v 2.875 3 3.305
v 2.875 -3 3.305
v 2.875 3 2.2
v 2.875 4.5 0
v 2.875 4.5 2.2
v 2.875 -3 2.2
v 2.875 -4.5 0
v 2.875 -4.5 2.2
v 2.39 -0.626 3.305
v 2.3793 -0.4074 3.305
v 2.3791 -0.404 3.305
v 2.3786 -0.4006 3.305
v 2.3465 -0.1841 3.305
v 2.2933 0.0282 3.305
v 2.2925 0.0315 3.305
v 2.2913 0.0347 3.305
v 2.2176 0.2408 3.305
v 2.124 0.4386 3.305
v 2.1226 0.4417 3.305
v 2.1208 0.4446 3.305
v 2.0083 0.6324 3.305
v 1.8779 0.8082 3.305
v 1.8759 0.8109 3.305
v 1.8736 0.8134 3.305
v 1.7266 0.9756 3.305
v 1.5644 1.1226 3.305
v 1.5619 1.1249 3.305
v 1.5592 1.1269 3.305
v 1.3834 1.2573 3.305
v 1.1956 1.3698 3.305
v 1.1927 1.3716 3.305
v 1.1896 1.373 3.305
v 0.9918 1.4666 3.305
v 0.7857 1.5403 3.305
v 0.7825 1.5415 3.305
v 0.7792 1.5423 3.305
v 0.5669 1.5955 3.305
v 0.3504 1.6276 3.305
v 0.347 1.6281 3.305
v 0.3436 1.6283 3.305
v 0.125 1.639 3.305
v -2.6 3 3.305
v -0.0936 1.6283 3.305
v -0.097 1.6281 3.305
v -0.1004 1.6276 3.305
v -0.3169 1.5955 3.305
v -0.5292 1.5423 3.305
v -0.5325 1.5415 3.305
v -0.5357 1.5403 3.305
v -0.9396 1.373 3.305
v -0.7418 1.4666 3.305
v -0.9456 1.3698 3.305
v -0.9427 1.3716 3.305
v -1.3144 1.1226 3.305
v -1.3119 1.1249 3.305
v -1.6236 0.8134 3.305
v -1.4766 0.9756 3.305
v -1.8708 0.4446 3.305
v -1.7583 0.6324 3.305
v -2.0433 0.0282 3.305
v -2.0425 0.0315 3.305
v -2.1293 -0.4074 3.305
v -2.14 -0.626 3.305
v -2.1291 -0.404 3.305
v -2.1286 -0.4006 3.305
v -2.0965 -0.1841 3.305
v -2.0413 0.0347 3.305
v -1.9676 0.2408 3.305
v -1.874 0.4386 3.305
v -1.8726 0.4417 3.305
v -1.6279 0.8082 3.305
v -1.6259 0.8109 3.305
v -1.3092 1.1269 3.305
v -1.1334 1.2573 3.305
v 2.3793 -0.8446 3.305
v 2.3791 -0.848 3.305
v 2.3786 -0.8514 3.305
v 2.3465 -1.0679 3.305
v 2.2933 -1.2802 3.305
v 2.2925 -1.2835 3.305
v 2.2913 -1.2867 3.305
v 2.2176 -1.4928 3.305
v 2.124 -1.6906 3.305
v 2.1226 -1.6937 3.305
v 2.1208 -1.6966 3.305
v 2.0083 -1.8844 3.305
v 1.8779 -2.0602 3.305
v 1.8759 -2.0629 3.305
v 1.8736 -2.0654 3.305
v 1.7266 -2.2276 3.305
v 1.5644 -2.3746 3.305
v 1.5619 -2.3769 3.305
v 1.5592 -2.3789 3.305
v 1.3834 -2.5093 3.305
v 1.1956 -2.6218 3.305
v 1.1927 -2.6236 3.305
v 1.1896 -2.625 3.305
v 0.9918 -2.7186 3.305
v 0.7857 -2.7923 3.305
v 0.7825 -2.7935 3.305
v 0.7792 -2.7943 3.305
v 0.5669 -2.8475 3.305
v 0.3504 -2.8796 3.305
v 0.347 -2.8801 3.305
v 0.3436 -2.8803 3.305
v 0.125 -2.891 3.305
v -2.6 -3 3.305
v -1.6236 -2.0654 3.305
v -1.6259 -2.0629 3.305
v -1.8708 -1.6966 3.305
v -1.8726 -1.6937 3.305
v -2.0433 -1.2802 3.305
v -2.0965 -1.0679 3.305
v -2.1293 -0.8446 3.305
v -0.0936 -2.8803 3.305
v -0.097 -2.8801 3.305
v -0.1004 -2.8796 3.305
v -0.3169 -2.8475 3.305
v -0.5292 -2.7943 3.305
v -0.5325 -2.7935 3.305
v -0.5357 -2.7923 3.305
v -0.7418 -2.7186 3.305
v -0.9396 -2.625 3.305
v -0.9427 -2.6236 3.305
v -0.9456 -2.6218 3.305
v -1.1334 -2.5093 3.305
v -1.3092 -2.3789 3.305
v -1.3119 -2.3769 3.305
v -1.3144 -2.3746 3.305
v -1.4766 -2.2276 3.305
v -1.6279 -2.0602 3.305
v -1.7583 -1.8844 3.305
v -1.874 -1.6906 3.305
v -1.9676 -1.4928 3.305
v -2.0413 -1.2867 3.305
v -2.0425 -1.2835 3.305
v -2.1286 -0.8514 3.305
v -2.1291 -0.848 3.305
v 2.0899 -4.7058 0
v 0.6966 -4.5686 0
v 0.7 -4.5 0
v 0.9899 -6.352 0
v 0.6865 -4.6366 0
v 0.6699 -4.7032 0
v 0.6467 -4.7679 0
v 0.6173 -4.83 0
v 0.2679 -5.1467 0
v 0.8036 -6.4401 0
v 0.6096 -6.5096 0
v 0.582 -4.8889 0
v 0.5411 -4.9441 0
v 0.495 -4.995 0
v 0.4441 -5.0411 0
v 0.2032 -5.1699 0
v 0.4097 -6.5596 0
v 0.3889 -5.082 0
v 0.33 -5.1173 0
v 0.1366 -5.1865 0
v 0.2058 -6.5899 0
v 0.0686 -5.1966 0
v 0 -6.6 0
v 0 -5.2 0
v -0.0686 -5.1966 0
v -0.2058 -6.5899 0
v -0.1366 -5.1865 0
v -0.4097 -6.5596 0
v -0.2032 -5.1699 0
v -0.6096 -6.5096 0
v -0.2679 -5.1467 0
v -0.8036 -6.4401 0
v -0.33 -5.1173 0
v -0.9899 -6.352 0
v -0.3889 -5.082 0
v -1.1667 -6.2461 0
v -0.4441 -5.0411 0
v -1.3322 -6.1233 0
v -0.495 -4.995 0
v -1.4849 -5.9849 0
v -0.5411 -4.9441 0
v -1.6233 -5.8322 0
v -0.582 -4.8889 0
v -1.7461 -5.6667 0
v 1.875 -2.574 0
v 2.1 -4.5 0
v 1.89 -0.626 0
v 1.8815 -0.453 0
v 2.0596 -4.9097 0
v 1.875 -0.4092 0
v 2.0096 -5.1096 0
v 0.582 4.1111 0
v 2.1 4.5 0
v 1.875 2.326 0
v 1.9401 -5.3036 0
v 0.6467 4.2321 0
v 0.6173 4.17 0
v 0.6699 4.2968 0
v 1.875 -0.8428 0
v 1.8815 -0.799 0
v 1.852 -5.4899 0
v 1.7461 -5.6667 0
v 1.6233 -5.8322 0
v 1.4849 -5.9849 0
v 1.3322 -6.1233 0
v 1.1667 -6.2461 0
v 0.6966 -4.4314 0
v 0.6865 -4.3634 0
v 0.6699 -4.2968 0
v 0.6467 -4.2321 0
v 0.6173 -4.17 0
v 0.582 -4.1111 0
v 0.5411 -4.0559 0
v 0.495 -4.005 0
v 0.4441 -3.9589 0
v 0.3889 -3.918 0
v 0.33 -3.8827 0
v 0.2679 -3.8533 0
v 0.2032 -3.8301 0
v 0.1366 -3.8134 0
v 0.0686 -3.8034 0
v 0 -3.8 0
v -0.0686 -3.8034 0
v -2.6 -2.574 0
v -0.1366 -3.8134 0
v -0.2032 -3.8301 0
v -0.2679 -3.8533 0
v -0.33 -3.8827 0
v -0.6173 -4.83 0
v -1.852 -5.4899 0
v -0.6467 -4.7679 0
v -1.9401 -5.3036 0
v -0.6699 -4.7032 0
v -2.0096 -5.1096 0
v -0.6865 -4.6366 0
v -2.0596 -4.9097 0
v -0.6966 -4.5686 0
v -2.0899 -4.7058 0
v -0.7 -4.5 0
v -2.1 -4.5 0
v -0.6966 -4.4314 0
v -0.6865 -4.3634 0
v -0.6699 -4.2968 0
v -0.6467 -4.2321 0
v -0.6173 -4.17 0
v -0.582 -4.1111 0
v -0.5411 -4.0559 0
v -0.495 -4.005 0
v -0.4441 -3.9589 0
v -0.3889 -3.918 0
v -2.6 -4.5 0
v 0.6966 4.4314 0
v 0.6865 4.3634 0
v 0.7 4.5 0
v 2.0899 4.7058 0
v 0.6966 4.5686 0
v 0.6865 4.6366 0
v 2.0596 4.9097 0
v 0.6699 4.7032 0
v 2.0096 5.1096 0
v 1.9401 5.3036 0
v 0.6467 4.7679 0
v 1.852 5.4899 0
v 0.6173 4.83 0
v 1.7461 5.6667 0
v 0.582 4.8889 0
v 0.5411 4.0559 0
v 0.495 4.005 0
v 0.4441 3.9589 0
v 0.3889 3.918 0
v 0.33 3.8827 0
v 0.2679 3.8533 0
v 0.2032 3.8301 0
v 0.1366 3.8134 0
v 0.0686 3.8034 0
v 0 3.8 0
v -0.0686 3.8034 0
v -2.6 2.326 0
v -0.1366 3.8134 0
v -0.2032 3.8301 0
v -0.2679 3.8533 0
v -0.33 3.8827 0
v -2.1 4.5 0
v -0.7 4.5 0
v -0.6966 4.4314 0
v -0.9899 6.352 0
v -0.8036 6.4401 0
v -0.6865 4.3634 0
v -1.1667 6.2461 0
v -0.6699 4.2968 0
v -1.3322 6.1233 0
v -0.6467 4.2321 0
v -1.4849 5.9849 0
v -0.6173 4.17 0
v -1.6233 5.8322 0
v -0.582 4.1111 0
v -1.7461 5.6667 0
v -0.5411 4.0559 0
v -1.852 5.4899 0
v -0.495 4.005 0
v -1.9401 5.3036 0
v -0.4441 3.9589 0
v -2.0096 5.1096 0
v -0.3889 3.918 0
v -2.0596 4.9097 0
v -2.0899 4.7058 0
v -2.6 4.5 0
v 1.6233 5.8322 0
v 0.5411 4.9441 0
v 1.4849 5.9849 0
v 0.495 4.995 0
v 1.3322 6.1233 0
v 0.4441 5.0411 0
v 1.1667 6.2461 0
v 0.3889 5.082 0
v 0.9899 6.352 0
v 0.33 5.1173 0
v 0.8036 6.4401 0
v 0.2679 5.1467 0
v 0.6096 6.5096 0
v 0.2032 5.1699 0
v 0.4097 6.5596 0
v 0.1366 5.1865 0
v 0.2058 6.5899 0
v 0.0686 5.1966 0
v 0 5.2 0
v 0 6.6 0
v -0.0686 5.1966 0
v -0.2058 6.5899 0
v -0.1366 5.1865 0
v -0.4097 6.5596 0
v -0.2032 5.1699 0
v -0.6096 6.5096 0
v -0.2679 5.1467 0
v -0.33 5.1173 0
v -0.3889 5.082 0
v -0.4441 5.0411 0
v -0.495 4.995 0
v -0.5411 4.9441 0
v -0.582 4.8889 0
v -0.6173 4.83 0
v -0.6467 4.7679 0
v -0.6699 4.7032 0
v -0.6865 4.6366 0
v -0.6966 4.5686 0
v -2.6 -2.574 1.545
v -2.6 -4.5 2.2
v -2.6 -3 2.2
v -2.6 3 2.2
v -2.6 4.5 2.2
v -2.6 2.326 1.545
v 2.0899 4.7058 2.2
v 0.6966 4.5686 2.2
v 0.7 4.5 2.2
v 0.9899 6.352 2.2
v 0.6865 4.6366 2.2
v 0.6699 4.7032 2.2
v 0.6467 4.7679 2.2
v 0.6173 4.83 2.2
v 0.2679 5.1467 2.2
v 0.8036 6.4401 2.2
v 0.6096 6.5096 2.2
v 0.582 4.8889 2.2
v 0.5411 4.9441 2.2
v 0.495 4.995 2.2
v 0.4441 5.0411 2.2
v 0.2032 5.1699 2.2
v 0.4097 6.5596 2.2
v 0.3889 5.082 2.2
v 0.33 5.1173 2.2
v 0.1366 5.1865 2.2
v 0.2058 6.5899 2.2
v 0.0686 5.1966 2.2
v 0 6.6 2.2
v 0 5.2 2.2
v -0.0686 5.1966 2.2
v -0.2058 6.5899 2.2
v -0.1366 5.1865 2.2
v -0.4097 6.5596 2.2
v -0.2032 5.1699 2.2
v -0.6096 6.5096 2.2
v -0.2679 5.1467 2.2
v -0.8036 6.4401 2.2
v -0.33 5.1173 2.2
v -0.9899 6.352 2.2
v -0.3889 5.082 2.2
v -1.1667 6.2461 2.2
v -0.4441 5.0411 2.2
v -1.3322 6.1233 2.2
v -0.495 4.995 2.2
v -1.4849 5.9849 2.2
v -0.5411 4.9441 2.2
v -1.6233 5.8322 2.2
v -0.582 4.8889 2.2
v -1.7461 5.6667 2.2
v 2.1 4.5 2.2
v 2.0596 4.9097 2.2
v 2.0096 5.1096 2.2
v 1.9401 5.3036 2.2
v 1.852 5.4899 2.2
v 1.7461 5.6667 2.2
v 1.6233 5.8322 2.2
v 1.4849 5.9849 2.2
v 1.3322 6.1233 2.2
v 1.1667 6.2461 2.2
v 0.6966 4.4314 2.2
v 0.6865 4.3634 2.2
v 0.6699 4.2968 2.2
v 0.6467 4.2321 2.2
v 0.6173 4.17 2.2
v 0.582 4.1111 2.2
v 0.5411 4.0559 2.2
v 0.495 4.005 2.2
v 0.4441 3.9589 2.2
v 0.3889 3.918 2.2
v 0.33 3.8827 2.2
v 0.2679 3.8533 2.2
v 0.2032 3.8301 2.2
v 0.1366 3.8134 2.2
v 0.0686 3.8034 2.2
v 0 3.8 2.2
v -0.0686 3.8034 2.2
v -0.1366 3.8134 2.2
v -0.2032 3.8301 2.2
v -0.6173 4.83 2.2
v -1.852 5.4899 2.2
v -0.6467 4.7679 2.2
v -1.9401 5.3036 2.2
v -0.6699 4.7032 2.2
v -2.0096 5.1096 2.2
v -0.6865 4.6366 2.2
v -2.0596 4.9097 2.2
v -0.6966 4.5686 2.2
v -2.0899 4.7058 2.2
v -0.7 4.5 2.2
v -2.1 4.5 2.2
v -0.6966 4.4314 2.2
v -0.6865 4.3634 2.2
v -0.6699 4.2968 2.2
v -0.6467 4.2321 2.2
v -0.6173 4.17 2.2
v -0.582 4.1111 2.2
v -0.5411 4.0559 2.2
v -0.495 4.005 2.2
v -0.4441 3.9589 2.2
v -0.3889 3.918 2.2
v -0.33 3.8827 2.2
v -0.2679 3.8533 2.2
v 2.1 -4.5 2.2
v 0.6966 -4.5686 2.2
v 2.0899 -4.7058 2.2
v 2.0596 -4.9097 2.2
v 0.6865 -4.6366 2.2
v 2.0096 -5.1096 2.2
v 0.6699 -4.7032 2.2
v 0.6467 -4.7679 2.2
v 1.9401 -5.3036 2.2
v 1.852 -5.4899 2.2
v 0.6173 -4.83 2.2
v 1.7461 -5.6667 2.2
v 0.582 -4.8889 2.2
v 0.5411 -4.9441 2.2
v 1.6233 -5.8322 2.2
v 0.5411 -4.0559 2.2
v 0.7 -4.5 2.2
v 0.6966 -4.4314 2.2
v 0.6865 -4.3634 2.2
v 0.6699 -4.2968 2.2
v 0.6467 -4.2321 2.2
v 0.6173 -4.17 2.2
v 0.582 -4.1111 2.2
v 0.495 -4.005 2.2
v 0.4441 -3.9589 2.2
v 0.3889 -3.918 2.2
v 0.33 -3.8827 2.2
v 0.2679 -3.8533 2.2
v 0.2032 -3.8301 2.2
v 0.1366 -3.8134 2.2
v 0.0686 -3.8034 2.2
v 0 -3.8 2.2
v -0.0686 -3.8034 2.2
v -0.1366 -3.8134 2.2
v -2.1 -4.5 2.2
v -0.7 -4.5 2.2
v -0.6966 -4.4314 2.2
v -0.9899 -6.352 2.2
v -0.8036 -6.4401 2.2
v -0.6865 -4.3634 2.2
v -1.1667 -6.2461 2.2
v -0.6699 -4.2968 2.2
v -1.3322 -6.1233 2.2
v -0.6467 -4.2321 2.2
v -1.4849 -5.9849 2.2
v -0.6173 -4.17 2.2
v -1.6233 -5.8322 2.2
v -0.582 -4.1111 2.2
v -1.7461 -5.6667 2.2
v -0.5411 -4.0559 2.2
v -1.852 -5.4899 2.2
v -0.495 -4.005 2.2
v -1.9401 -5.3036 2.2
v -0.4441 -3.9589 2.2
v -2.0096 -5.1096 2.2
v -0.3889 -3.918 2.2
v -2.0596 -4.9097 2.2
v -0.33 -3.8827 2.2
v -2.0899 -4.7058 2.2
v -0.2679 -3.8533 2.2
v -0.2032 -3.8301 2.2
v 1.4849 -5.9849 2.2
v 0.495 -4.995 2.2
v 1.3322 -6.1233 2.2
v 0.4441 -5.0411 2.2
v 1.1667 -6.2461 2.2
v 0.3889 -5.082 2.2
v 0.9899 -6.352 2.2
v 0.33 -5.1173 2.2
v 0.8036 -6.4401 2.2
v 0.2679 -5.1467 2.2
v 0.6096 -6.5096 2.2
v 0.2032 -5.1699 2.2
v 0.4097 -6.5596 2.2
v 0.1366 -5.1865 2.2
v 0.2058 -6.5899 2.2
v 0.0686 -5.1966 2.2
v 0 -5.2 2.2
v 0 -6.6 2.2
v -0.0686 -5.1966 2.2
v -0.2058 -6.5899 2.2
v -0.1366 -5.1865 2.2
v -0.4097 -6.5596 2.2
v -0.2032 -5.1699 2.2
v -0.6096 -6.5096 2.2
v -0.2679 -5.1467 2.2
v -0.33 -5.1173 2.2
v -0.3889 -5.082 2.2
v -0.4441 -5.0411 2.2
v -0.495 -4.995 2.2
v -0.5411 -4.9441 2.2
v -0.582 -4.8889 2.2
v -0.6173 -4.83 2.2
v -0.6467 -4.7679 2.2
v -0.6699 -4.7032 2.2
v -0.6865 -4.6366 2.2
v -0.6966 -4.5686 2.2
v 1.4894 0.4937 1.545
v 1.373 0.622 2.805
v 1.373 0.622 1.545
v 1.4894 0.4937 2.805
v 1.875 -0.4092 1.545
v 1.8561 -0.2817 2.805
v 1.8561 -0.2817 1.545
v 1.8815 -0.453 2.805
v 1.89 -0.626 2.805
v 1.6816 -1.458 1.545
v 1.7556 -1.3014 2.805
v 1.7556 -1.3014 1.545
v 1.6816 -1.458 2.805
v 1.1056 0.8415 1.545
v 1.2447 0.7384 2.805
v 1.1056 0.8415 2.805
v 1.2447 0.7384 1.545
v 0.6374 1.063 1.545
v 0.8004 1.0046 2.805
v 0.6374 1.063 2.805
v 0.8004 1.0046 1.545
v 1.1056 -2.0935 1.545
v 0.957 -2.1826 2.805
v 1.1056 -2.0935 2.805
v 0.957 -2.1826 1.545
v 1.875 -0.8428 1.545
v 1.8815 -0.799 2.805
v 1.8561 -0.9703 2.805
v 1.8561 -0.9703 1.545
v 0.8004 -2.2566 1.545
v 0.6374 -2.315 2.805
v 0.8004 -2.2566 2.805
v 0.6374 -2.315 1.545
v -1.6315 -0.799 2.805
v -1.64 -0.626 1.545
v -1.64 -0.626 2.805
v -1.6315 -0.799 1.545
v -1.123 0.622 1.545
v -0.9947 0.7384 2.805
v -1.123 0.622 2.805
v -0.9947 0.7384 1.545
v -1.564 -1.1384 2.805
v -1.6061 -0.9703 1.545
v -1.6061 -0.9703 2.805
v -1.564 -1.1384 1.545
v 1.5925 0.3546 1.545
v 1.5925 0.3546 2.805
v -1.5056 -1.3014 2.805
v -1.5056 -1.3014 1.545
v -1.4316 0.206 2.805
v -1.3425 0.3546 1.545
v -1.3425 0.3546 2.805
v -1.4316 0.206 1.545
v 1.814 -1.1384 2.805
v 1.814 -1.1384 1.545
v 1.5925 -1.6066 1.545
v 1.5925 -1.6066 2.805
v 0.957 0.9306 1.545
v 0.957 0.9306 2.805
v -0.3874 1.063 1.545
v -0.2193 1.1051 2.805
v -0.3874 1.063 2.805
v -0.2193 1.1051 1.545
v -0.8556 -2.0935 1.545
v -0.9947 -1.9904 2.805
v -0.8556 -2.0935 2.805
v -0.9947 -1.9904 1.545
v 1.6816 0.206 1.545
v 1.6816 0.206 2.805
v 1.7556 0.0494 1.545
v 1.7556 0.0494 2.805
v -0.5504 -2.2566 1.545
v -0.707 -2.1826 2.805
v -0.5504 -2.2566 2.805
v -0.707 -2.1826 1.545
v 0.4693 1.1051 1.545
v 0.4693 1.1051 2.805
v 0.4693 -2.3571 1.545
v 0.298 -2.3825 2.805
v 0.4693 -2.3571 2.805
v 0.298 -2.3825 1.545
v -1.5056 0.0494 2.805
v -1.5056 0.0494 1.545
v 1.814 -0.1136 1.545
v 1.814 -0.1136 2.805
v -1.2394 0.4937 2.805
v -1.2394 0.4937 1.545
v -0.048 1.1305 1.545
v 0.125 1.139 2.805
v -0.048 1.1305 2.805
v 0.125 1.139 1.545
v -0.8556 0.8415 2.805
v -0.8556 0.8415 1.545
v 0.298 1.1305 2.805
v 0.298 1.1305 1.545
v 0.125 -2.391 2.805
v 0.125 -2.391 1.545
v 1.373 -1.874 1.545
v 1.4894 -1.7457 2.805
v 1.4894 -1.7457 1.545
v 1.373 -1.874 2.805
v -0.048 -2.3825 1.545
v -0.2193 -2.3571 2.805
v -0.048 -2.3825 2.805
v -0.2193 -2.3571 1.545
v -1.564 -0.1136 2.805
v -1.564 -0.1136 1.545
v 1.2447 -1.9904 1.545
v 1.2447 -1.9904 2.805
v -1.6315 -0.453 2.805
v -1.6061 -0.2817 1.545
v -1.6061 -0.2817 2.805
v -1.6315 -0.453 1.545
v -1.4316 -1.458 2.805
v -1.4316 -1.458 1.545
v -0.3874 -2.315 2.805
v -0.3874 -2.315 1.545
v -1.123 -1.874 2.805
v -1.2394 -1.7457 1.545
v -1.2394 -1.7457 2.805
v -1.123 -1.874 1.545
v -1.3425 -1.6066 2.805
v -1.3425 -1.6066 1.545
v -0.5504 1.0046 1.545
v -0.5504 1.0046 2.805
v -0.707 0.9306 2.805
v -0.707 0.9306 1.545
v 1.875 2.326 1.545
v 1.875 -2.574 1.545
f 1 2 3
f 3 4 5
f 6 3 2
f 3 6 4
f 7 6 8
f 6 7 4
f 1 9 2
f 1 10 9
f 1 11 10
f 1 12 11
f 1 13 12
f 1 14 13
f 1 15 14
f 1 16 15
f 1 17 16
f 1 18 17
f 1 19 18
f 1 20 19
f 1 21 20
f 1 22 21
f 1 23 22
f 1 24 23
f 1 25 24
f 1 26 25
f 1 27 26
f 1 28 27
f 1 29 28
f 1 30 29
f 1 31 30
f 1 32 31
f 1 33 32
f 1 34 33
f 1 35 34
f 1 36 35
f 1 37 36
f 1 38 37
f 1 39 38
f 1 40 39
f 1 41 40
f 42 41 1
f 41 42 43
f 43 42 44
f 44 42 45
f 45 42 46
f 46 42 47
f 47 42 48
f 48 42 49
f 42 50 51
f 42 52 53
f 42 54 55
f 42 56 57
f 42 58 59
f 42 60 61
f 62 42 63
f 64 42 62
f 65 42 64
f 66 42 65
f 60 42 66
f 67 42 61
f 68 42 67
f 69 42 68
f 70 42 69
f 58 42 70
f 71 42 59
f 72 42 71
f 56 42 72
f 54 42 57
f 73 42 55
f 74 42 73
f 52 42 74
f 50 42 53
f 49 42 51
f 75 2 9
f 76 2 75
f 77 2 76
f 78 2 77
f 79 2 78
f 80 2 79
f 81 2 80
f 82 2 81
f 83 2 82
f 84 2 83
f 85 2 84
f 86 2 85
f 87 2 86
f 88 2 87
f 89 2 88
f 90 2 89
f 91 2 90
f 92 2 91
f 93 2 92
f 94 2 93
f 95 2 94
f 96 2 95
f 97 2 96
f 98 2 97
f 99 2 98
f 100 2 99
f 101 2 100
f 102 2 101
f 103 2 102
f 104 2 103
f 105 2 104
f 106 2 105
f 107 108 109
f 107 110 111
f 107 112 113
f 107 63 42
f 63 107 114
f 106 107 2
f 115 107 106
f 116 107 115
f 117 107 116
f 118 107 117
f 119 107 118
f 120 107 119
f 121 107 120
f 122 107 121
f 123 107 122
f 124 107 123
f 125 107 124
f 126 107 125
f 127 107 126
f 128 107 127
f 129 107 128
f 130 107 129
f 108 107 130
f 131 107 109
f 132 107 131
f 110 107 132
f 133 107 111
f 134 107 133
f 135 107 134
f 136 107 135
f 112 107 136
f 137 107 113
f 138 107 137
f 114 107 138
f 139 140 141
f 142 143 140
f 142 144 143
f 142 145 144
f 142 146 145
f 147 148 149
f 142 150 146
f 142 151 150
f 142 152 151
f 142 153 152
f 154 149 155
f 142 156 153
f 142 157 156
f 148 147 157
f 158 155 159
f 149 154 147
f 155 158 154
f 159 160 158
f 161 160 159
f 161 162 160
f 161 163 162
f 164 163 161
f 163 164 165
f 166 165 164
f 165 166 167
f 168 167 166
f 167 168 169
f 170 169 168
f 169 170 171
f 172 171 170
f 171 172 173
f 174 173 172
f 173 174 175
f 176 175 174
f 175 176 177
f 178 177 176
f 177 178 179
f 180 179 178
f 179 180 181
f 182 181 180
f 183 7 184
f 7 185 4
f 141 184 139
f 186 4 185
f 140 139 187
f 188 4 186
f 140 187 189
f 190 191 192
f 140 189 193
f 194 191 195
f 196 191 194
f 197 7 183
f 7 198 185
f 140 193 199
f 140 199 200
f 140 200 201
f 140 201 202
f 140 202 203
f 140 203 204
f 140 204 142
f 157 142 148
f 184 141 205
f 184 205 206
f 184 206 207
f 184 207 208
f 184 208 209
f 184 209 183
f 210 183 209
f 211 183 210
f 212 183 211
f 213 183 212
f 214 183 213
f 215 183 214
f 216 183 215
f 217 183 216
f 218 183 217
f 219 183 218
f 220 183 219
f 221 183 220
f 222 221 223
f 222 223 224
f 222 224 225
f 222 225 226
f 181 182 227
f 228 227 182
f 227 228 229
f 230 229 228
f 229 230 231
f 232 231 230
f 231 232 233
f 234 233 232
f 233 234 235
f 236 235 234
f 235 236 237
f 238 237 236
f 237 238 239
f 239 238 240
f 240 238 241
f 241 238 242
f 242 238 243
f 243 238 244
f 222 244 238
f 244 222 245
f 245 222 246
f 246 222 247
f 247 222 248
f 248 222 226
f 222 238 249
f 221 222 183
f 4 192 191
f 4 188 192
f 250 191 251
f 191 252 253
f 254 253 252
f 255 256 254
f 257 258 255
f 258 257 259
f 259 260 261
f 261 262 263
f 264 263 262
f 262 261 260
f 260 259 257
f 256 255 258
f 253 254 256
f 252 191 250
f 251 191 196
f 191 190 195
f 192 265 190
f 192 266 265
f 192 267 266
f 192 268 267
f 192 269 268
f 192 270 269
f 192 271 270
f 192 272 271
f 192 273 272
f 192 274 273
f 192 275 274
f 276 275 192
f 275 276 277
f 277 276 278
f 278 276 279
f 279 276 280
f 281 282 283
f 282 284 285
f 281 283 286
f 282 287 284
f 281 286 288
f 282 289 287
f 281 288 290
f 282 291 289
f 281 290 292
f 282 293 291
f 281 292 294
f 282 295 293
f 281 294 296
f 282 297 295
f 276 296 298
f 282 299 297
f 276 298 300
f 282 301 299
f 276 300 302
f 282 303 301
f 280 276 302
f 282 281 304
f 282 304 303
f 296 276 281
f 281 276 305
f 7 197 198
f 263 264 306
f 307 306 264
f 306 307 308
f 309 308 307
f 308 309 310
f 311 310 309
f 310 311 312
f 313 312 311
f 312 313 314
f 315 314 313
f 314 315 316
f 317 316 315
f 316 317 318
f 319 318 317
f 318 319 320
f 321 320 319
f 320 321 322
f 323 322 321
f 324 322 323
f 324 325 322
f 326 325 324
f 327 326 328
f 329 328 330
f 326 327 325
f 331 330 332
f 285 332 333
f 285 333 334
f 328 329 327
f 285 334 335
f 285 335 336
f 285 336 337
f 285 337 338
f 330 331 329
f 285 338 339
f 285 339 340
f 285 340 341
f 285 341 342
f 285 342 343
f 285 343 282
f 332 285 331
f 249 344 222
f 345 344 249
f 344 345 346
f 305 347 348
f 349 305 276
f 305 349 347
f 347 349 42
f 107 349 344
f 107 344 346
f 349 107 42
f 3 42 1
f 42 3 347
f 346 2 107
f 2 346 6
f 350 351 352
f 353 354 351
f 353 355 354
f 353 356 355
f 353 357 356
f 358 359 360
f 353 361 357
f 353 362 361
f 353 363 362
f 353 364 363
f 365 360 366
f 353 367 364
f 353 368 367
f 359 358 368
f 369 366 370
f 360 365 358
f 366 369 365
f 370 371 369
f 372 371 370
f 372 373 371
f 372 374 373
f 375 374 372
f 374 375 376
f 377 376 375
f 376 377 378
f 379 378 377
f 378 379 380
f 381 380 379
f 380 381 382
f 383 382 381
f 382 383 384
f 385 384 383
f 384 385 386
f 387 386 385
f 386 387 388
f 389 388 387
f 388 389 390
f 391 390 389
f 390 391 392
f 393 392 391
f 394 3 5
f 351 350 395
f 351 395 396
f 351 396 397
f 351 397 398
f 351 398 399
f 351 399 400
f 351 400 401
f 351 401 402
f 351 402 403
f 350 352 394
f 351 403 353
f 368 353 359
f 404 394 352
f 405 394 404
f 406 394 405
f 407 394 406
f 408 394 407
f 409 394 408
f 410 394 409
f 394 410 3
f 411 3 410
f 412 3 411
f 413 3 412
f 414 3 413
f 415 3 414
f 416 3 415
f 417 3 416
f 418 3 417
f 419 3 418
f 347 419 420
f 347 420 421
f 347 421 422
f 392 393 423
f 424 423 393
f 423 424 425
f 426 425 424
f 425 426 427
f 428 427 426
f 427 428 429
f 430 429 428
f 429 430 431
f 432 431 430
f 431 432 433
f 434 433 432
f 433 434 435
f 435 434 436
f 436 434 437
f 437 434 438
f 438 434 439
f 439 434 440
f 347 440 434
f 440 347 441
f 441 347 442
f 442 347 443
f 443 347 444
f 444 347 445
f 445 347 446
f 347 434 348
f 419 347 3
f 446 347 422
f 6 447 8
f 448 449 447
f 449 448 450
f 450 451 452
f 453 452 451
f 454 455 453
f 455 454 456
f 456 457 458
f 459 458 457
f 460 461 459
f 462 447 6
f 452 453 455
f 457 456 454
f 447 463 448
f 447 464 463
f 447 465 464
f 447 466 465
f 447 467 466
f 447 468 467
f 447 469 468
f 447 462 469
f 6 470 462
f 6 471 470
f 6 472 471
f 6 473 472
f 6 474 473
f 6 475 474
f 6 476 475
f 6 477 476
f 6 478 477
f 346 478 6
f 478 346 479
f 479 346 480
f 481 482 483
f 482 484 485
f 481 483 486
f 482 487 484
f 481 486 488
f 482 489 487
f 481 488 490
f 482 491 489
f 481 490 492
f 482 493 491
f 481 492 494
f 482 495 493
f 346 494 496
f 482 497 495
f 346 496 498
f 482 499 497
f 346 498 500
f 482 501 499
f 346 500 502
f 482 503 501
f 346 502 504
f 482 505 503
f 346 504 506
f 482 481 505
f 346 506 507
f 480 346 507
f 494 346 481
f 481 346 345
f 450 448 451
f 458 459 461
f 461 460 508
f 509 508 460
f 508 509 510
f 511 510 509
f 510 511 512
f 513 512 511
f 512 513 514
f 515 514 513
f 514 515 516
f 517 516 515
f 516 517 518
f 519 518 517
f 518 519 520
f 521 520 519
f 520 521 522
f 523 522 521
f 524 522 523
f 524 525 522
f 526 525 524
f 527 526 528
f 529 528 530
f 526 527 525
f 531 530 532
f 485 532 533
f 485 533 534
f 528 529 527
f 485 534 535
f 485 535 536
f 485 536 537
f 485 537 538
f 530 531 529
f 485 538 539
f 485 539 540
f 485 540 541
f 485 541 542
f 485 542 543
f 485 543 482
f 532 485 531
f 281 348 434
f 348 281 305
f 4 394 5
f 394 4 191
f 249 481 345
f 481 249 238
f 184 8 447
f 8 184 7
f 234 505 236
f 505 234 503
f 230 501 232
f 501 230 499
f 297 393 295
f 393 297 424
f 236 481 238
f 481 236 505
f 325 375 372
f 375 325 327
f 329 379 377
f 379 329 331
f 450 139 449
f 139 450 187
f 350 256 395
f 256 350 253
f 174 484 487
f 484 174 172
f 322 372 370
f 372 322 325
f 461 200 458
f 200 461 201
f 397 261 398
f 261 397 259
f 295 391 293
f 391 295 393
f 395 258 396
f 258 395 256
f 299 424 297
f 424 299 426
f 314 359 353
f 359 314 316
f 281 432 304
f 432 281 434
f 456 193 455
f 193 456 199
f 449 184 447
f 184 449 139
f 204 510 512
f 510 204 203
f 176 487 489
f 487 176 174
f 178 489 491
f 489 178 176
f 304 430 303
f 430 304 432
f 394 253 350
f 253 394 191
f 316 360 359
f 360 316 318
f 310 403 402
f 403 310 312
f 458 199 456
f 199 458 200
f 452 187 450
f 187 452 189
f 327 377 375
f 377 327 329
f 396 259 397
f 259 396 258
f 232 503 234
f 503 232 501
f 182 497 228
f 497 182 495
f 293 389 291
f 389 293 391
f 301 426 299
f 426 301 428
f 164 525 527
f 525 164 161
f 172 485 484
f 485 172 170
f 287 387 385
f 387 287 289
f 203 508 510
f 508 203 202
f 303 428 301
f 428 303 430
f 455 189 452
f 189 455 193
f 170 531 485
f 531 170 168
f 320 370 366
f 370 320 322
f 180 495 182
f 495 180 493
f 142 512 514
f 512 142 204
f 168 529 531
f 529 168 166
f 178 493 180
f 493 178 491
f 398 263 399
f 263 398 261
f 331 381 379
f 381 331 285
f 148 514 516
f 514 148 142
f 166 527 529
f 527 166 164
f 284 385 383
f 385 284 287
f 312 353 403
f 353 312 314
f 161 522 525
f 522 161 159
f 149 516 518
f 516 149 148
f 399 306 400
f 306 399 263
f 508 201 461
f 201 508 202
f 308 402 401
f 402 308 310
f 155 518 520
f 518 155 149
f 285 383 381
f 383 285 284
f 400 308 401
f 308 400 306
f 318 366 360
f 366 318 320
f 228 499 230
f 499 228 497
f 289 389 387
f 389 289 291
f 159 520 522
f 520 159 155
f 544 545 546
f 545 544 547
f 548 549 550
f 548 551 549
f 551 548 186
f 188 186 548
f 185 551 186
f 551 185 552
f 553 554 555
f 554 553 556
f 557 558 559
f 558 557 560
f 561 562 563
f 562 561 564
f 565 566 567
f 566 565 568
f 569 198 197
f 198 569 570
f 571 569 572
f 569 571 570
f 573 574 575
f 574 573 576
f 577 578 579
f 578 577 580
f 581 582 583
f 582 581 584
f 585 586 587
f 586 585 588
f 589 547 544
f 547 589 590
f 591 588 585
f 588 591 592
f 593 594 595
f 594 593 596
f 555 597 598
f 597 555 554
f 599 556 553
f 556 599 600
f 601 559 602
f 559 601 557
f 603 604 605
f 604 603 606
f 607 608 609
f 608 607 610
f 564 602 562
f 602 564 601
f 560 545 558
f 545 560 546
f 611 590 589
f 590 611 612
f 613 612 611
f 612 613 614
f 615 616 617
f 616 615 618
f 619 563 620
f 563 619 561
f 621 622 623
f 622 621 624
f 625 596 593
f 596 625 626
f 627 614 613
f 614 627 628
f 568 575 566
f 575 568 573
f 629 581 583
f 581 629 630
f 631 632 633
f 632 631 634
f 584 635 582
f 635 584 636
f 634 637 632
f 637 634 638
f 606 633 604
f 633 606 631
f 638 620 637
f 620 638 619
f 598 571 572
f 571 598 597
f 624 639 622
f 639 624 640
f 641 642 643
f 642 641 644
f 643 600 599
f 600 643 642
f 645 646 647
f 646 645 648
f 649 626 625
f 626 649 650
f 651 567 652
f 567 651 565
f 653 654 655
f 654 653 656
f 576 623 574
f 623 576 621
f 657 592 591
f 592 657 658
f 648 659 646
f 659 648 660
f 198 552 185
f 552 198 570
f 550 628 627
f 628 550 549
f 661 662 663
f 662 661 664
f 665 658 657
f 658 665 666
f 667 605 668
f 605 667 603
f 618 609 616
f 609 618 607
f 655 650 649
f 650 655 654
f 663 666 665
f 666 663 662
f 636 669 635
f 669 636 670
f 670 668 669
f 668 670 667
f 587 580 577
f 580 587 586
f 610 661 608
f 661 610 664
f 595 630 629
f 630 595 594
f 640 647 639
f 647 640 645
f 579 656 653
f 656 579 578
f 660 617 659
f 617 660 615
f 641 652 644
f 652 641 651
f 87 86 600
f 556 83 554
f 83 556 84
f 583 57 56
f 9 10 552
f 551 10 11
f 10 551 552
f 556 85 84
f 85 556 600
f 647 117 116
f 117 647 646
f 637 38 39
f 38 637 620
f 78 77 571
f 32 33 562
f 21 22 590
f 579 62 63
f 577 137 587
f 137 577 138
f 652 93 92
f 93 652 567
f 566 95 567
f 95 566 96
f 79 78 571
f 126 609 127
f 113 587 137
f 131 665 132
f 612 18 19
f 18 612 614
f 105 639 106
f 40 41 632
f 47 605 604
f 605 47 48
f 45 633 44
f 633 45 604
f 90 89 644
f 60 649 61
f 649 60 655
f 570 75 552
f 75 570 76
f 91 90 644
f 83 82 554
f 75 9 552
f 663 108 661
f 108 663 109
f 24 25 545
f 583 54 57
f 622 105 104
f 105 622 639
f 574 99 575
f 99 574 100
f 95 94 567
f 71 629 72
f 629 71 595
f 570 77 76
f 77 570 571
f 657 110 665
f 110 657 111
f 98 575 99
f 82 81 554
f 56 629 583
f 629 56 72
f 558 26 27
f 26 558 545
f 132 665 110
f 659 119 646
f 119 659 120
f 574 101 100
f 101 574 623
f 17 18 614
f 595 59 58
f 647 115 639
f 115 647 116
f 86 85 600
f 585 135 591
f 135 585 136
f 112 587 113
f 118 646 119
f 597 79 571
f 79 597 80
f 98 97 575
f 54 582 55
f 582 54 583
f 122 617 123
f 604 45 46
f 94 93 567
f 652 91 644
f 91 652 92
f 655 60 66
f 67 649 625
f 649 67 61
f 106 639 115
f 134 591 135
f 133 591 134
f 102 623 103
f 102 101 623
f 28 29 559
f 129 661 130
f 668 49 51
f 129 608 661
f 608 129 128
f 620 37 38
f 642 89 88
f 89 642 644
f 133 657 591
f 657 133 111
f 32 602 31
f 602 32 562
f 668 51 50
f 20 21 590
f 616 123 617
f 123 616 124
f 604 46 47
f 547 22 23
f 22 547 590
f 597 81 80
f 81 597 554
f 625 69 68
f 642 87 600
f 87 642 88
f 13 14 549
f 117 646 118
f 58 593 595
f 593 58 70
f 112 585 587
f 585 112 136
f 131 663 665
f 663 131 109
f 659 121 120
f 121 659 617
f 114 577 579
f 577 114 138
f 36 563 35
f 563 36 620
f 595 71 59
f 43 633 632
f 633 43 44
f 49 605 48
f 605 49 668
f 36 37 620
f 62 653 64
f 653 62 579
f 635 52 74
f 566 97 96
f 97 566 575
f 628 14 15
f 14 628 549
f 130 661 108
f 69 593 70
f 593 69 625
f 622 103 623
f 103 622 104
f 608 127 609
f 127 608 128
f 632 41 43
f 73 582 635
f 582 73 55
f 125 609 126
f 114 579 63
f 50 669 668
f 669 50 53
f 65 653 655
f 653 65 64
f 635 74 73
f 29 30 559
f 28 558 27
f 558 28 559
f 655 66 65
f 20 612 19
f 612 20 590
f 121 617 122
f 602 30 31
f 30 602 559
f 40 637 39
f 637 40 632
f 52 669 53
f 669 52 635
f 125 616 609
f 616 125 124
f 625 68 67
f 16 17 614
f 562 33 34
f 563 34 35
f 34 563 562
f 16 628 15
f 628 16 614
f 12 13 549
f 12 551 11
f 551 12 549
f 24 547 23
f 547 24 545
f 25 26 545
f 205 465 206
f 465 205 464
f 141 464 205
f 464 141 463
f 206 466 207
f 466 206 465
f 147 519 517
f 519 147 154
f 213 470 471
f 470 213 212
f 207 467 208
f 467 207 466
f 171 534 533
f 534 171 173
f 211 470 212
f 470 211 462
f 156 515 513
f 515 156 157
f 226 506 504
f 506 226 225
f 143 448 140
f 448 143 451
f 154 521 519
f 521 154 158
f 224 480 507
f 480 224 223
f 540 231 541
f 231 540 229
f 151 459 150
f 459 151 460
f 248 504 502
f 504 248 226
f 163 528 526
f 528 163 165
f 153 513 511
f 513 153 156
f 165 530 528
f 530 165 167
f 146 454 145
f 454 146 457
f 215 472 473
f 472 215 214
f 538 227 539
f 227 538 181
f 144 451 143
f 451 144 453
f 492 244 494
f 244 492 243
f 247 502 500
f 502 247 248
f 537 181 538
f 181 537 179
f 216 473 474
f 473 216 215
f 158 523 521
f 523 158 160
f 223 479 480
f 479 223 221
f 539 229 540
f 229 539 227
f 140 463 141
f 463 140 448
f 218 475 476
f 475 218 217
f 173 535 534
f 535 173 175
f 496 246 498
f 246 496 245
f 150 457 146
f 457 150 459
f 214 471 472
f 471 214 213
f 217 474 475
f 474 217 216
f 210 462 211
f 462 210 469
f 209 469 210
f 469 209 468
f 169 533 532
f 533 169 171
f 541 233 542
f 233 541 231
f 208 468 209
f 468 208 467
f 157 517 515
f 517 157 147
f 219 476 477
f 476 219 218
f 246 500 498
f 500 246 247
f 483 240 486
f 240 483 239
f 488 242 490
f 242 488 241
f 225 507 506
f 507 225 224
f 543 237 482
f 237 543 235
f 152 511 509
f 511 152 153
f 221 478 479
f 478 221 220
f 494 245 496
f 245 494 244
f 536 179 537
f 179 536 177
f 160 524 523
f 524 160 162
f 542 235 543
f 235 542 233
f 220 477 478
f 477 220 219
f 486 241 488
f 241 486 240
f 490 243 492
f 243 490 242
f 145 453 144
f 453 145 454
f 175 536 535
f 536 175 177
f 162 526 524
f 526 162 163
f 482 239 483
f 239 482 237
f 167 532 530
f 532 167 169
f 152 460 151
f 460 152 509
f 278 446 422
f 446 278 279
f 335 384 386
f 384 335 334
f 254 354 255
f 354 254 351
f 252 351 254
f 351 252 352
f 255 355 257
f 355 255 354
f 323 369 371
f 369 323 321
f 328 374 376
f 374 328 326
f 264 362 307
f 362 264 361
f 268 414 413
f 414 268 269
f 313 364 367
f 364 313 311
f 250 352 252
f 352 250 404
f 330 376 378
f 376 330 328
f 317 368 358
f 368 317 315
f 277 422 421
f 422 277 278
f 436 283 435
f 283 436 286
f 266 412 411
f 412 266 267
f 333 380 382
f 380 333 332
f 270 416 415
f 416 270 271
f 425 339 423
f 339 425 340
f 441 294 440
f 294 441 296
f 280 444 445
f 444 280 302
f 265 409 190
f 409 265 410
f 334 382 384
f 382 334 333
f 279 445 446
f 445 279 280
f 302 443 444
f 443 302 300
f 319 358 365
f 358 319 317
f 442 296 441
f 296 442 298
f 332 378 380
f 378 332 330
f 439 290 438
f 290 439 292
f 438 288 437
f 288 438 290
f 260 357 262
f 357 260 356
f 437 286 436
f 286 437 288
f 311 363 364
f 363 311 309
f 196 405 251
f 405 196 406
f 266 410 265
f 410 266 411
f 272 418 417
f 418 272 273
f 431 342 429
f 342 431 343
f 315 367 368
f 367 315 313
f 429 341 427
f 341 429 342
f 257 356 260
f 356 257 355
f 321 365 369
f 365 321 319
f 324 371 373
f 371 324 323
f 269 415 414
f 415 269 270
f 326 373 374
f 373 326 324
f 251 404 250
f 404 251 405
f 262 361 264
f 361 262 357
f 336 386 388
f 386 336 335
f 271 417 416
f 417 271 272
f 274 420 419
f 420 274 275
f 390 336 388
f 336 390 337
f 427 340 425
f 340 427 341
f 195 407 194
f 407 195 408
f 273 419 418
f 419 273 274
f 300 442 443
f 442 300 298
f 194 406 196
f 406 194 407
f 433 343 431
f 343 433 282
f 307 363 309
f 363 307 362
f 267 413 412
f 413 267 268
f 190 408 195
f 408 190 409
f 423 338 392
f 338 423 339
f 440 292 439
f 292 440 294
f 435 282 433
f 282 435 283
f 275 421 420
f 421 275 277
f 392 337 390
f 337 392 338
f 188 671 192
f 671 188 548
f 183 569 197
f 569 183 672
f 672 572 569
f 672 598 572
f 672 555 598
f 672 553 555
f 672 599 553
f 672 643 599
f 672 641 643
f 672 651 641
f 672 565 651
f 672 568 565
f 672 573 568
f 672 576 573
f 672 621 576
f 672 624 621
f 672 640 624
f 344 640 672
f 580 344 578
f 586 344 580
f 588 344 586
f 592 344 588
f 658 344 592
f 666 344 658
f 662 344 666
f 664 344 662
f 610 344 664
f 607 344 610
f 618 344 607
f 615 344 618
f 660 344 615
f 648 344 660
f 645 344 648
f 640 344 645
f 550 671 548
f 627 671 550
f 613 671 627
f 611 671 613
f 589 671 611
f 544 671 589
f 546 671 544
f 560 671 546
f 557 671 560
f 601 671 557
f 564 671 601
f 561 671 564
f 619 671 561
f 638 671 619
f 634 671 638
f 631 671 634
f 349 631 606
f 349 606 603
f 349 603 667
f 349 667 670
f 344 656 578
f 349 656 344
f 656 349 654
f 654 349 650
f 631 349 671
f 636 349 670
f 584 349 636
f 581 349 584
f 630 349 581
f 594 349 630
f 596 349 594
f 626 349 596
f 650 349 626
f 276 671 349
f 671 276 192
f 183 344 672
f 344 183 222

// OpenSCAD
// BMV080 sensor shroud for the Sensr Air PCB (air-stcc4 v0.4.0)
// https://github.com/romkey/sensr-air
//
// A small cage that bridges the BMV080 sensor head and fastens to the two
// 1.3 mm plated holes on either side of it. It locates the LGA package in
// X/Y, keeps it from lifting off the board, and leaves the lens and the
// laser path completely open. The rim stands slightly proud of the lens so
// a finger or a tabletop touches plastic first.
//
// Coordinate system (all mm):
//   origin = midpoint between the two shroud holes  = KiCad (48.5, 27.0)
//   +X     = toward the tip of the flex (away from the FPC connector)
//   +Y     = toward the top edge of the board (KiCad -Y)
//   Z = 0  = top surface of the PCB
//
// Printing: 0.1-0.12 mm layers, 0.4 mm nozzle (0.25 is nicer).
//   mount = "screw": print as modelled, PCB face on the bed. The 4.9 mm
//                    ceiling over the sensor is a short bridge, no supports.
//   mount = "peg":   printed upside down (done automatically by print_layout)
//                    so the pegs stand upright.

/* [Mounting] */
// "screw": through holes for M1.2 screws. "peg": printed pegs to glue or heat-stake.
mount = "screw"; // [screw, peg]
// Screw hole in the ears. 1.4 = M1.2 clearance (nut on the back of the PCB). Use ~1.0 to self-tap an M1.2 screw driven from the back.
screw_hole_d = 1.4;
// Peg diameter for the 1.3 mm PCB holes.
peg_d = 1.15;
// How far the pegs stick out of the back of the PCB.
peg_protrusion = 0.8;
// Screw head diameter; the tall centre section stops short of the ears to leave room for it.
screw_head_d = 2.6;

/* [PCB - from air-stcc4.kicad_pcb 0.4.0] */
hole_spacing = 9.0;      // vias at (48.5, 22.5) and (48.5, 31.5)
pcb_t = 1.6;
// LGA package centre relative to the hole midpoint (silkscreen outline centre 48.625, 27.124).
lga_center = [0.125, -0.124];

/* [BMV080 - from datasheet BST-BMV080-DS000-12, Fig. 7] */
flex_w = 4.4;            // flex width at the sensor head
flex_t = 0.225;          // flex thickness under the LGA
lga_len = 3.0;           // LGA along the flex
lga_w = 4.3;             // LGA across the flex
lga_shoulder_h = 1.22;   // tallest part of the LGA body, above the flex
lens_top_h = 2.78;       // top of the lens, above the flex
lens_d = 2.58;           // +/- 0.15
// Lens centre measured from the LGA edge (1.648 in the datasheet).
lens_edge_offset = 1.648;
// Which side of the flex centreline the lens sits on. -1 matches the datasheet with the flex contacts facing the PCB. Flip to 1 if your lens is on the other side.
lens_side = -1; // [-1, 1]
// Thermal tape / pad between the flex and the PCB, if you use one.
tape_t = 0.0;

/* [Fit] */
// Side clearance between the flex and the pocket walls.
xy_clear = 0.25;
// Gap between the top of the LGA and the ceiling. The sensor is captured, not clamped (max 3 N allowed on the package).
z_clear = 0.10;
// Radial clearance around the lens.
lens_clear = 0.40;
// How far the rim stands above the top of the lens.
lens_guard = 0.30;

/* [Body] */
ear_d = 4.2;
// Height of the screw ears (screw mode). Pegged ears are always full height.
ear_h = 2.2;
// Wall beyond the tip of the flex.
tip_wall = 1.0;
// How far the body reaches back over the flex, measured from the hole line.
back_reach = 2.6;
// 45 degree chamfer around the top of the lens opening.
lens_chamfer = 0.5;

/* [View] */
// Show the PCB and sensor as a transparent reference (never exported).
show_ghost = false;
// Orient the part for printing (only changes peg mode).
print_layout = true;

/* [Hidden] */
$fn = 64;
eps = 0.01;

ceiling_z = tape_t + flex_t + lga_shoulder_h + z_clear;
top_z     = tape_t + flex_t + lens_top_h + lens_guard;
pocket_w  = flex_w + 2 * xy_clear;
tip_x     = lga_center[0] + lga_len / 2 + xy_clear;   // inside face beyond the flex tip
body_x0   = -back_reach;
body_x1   = tip_x + tip_wall;
lens_pos  = [lga_center[0],
             lga_center[1] + lens_side * (lga_w / 2 - lens_edge_offset)];
lens_hole_d = lens_d + 0.15 + 2 * lens_clear;
ear_height  = mount == "peg" ? top_z : ear_h;
// half-length of the full-height centre section
tower_half  = mount == "peg" ? hole_spacing / 2
                             : hole_spacing / 2 - screw_head_d / 2 - 0.2;

module ears_2d() {
    for (s = [-1, 1]) translate([0, s * hole_spacing / 2]) circle(d = ear_d);
}

module body() {
    // central bar that bridges the sensor
    translate([body_x0, -tower_half, 0])
        cube([body_x1 - body_x0, 2 * tower_half, top_z]);
    translate([body_x0, -hole_spacing / 2, 0])
        cube([body_x1 - body_x0, hole_spacing, ear_height]);
    // screw / peg ears, blended into the bar
    linear_extrude(ear_height) hull() ears_2d();
}

module pocket() {
    // channel for the flex + LGA, open toward the connector
    translate([body_x0 - 1, lga_center[1] - pocket_w / 2, -eps])
        cube([tip_x - body_x0 + 1, pocket_w, ceiling_z + eps]);
}

module lens_opening() {
    translate([lens_pos[0], lens_pos[1], 0]) {
        cylinder(d = lens_hole_d, h = top_z + 1);
        translate([0, 0, top_z - lens_chamfer])
            cylinder(d1 = lens_hole_d, d2 = lens_hole_d + 2 * lens_chamfer + 2 * eps,
                     h = lens_chamfer + eps);
    }
}

module shroud() {
    difference() {
        body();
        pocket();
        lens_opening();
        if (mount == "screw")
            for (s = [-1, 1]) translate([0, s * hole_spacing / 2, -1])
                cylinder(d = screw_hole_d, h = top_z + 2);
    }
    if (mount == "peg")
        for (s = [-1, 1]) translate([0, s * hole_spacing / 2, -(pcb_t + peg_protrusion)])
            cylinder(d = peg_d, h = pcb_t + peg_protrusion + eps);
}

// Reference geometry: PCB patch, flex, LGA and lens.
module ghost() {
    color("green", 0.4) difference() {
        translate([-20, -8, -pcb_t]) cube([28, 15, pcb_t]);
        for (s = [-1, 1]) translate([0, s * hole_spacing / 2, -pcb_t - 1])
            cylinder(d = 1.3, h = pcb_t + 2);
    }
    tip = lga_center[0] + lga_len / 2;
    color("orange", 0.6)
        translate([tip - 20, lga_center[1] - flex_w / 2, tape_t]) cube([20, flex_w, flex_t]);
    color("silver", 0.8)
        translate([tip - lga_len, lga_center[1] - lga_w / 2, tape_t + flex_t])
            cube([lga_len, lga_w, 0.94]);
    color("dimgray", 0.8)   // raised shoulder, on the side away from the lens
        translate([tip - lga_len, lga_center[1] - lens_side * lga_w / 2
                   - (lens_side < 0 ? 0.759 : 0), tape_t + flex_t])
            cube([lga_len, 0.759, lga_shoulder_h]);
    color("white", 0.9)
        translate([lens_pos[0], lens_pos[1], tape_t + flex_t])
            cylinder(d = lens_d, h = lens_top_h);
}

if (show_ghost) {
    shroud();
    ghost();
} else if (print_layout && mount == "peg") {
    translate([0, 0, top_z]) rotate([180, 0, 0]) shroud();
} else {
    shroud();
}

echo(str("ceiling ", ceiling_z, " mm, top ", top_z, " mm, footprint ",
         body_x1 - body_x0, " x ", hole_spacing + ear_d, " mm"));
